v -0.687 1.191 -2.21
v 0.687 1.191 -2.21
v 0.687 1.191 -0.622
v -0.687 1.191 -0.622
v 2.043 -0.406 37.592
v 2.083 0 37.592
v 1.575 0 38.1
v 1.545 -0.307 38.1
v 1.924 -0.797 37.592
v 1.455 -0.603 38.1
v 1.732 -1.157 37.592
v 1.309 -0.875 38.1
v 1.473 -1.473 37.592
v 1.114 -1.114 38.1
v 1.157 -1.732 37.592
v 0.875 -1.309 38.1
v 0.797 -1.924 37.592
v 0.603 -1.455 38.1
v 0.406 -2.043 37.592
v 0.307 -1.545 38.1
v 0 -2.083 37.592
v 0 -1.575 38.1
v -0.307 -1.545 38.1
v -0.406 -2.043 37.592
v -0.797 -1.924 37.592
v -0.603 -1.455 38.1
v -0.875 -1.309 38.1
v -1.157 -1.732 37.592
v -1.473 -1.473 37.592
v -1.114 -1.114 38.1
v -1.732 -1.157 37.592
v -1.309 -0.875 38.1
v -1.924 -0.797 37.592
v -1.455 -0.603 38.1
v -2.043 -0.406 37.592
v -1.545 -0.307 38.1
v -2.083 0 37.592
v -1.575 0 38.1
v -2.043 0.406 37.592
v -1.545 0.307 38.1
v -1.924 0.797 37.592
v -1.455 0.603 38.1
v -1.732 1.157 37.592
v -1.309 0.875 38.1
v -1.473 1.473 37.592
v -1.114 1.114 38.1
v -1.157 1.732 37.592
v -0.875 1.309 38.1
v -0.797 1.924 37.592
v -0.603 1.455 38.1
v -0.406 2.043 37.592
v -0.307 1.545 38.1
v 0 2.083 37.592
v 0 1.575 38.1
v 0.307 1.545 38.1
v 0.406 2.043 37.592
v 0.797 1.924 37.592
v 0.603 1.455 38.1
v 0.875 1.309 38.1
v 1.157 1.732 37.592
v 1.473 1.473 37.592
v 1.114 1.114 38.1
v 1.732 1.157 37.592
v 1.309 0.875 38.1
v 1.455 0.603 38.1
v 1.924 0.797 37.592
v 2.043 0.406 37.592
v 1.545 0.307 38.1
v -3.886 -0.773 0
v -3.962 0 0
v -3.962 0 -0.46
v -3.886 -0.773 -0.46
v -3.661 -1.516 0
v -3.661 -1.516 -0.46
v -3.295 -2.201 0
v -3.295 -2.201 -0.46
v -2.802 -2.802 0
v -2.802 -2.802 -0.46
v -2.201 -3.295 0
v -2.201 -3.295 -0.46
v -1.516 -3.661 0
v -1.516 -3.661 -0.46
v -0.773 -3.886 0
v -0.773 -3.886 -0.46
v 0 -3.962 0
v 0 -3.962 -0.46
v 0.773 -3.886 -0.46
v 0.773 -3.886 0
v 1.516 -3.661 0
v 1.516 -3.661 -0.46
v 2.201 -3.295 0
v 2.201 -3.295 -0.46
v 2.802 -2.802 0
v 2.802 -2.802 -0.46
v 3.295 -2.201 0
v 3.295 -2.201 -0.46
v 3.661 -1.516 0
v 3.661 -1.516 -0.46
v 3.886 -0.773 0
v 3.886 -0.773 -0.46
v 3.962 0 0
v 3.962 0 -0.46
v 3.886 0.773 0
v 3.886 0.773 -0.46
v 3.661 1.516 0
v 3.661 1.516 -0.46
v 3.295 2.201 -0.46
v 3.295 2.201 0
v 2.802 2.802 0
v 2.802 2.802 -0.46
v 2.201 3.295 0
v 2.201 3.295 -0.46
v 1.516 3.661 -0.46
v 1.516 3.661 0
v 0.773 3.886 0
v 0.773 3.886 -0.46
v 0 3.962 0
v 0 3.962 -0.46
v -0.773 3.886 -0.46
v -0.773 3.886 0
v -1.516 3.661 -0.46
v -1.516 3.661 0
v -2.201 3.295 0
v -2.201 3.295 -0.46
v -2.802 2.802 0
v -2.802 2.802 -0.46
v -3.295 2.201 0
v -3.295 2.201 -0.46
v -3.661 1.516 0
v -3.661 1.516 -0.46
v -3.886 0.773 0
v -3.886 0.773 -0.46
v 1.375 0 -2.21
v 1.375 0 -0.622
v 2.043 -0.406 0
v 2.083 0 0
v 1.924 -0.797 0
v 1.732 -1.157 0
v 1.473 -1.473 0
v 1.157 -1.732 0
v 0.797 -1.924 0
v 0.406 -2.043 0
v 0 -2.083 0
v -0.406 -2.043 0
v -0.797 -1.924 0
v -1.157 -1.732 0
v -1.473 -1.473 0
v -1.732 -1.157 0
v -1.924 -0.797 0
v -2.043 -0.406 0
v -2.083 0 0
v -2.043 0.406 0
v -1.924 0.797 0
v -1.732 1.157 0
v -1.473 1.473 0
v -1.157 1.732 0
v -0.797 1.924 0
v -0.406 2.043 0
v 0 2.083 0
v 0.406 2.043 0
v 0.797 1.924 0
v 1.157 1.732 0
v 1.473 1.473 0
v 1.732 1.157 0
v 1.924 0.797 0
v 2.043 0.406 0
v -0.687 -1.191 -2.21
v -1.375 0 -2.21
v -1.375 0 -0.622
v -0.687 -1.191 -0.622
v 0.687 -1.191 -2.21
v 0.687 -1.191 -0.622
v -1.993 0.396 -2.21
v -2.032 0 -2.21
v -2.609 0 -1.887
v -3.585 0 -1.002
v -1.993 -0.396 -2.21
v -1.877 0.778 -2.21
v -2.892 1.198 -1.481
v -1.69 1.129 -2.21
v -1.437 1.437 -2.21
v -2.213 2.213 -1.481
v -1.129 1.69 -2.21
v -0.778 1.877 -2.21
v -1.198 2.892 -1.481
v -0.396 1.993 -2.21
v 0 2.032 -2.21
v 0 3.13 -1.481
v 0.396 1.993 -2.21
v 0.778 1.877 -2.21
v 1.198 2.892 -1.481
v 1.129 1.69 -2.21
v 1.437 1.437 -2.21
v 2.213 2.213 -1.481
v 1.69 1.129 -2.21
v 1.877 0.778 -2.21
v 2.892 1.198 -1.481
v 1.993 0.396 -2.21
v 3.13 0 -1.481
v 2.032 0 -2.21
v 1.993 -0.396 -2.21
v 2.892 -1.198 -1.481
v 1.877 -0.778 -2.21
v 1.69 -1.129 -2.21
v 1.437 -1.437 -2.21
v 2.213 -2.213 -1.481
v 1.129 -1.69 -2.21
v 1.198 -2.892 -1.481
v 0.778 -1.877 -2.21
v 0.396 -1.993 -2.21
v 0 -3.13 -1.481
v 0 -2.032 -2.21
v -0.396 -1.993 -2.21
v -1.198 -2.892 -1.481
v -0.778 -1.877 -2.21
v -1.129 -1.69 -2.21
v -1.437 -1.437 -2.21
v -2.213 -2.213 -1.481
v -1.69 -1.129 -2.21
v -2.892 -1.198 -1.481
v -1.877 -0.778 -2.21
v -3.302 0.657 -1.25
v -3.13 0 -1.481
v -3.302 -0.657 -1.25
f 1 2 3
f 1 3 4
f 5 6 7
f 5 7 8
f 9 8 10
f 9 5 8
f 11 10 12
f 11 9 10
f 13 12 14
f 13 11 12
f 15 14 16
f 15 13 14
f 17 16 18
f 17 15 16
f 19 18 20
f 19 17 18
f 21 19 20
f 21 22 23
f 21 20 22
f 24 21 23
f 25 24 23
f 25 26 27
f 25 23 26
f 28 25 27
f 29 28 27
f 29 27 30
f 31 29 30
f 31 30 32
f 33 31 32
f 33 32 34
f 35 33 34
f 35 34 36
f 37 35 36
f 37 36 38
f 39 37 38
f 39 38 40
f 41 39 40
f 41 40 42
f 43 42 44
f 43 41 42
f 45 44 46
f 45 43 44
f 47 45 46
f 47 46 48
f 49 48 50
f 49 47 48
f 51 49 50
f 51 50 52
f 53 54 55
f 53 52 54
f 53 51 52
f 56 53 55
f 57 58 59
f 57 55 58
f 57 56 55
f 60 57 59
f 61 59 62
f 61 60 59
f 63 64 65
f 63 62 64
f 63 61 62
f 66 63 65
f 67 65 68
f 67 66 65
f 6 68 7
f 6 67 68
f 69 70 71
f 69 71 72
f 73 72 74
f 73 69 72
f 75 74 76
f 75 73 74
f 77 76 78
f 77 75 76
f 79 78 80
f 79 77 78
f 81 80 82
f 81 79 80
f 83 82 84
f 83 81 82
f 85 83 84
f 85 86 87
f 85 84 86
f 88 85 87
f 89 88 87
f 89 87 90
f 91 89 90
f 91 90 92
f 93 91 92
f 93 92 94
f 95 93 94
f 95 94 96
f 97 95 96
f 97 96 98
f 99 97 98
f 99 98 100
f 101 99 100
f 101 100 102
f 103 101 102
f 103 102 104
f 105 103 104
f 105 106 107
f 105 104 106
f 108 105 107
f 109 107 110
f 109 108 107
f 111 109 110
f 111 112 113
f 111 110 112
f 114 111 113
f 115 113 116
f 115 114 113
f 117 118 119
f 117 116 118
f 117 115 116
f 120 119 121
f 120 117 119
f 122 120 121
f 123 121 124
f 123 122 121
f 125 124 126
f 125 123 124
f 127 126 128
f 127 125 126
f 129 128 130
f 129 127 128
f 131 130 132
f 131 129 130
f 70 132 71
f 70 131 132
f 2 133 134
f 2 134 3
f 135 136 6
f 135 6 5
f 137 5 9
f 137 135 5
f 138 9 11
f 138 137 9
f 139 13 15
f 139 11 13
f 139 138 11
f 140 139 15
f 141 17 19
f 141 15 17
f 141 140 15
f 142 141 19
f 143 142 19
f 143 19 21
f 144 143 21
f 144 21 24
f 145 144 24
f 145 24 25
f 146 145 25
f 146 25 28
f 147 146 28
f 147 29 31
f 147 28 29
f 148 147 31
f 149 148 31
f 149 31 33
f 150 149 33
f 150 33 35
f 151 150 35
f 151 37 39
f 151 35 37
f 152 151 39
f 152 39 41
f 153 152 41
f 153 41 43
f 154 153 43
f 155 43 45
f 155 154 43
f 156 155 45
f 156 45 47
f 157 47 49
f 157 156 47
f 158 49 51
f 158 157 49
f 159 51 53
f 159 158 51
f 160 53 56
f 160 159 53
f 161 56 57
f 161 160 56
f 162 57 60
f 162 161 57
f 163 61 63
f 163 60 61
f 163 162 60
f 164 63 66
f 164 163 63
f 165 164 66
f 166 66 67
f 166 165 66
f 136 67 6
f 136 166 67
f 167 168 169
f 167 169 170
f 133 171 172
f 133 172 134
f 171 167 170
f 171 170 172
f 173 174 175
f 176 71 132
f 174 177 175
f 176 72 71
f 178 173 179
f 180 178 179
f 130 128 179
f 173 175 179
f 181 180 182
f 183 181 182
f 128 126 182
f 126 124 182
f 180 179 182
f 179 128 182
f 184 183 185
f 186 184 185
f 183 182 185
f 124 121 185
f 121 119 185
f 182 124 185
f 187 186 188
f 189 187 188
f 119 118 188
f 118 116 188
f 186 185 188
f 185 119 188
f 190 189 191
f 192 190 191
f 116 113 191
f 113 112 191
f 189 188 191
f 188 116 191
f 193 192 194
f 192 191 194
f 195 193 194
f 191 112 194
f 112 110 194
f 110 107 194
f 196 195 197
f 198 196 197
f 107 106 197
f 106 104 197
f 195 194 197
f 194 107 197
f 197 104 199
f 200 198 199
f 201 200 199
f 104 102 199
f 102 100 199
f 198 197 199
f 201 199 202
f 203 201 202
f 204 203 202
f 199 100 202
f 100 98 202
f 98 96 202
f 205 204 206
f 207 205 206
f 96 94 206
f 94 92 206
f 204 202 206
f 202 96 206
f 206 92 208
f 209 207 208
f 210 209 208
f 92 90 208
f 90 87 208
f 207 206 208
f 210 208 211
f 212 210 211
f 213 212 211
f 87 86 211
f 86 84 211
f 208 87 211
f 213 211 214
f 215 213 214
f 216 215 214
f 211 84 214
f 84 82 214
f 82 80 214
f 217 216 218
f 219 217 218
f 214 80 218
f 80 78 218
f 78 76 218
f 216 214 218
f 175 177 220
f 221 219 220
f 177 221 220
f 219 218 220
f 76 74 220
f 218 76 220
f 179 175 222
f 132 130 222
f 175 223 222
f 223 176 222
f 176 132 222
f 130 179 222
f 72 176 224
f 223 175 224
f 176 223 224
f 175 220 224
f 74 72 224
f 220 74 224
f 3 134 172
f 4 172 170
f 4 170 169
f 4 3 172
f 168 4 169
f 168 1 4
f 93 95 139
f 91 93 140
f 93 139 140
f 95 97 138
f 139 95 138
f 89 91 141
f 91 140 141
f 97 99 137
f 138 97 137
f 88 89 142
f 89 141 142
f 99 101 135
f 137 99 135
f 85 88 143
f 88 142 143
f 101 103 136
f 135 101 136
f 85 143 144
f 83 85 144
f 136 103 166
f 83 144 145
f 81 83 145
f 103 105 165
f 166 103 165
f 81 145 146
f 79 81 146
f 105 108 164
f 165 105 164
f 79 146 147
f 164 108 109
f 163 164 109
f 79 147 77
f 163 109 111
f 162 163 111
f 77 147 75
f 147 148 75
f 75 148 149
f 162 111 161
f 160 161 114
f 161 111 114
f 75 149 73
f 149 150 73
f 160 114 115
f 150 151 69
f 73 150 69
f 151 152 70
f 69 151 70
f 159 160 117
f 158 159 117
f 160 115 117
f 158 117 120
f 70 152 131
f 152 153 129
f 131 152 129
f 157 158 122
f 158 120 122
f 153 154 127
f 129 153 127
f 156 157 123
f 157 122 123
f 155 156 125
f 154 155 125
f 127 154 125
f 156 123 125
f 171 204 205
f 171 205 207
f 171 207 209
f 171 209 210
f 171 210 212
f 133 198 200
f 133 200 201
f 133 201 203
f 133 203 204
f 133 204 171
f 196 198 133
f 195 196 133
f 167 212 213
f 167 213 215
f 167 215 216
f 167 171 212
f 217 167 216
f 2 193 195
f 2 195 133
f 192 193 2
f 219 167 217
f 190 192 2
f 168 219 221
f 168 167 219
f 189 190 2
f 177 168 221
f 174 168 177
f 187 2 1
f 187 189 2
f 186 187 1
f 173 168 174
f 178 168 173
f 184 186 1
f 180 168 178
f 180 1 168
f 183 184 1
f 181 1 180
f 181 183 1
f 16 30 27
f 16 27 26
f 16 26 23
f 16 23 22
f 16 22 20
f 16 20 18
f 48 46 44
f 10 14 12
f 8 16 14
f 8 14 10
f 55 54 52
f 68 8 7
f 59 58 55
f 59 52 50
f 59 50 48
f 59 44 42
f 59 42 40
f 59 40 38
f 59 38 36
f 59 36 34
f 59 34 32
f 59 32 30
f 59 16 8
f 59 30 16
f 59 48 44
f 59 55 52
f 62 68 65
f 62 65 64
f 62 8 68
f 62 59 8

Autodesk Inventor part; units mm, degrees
ref_plane "YZ Plane" through (0, 0, 0) normal (1, 0, 0) x (0, 1, 0)
ref_plane "XZ Plane" through (0, 0, 0) normal (0, 1, 0) x (-1, 0, 0)
ref_plane "XY Plane" through (0, 0, 0) normal (0, 0, 1) x (1, 0, 0)
sketch "Sketch1" plane through (0, 0, 0) normal (0, 0, 1) x (1, 0, 0)
  circle A0 centre (0, 0) radius 2.0828
  dimension "d0" = 4.1656
extrude "Extrusion1" add sketch "Sketch1" along normal blind 38.1
sketch "Sketch2" plane through (0, 0, 0) normal (0, 1, 0) x (-1, 0, 0)
  line L0 (0, 0) -> (0, -2.2098)
  line L1 (0, 0) -> (3.9624, 0)
  line L2 (0, -2.2098) -> (2.032, -2.2098)
  line L3 (3.9624, 0) -> (3.9624, 3.6562) construction
  arc A0 (2.032, -2.2098) -> (3.9624, -0.4599) centre (0.1837, 1.7689) ccw
  line L4 (4.5847, 0.6553) -> (4.5847, -0.2608) construction
  line L5 (3.9624, -0.4599) -> (3.9624, 0)
  dimension "d3" = 2.2098
  dimension "d6" = 2.032
  dimension "d19" = 3.9624
revolve "Revolution1" add sketch "Sketch2" angle 360 about axis through (0, 0, 0) along (0, 0, -1)
sketch "Sketch3" plane through (0, 0, -2.2098) normal (0, 0, -1) x (-1, 0, 0)
  circle A0 centre (0, 0) radius 2.032 projected
  line L0 (-0.6874, 1.1906) -> (0.6874, 1.1906)
  line L1 (0.6874, 1.1906) -> (1.3748, 0)
  line L2 (1.3748, 0) -> (0.6874, -1.1906)
  line L3 (0.6874, -1.1906) -> (-0.6874, -1.1906)
  line L4 (-0.6874, -1.1906) -> (-1.3748, 0)
  line L5 (-1.3748, 0) -> (-0.6874, 1.1906)
  dimension "d8" = 2.3813
extrude "Extrusion2" cut sketch "Sketch3" against normal blind 1.5875 contours L0 L1 L2 L3 L4 L5
chamfer "Chamfer1" distance 0.508 angle 45 1 edges at (-2.0828, 0, 38.1)
thread "Thread1" size "8-32 UNC" class "2A" standard "ANSI Unified Screw Threads" length 25.4
properties part number "10-32 x500 button head" material "Aluminum 6061"
